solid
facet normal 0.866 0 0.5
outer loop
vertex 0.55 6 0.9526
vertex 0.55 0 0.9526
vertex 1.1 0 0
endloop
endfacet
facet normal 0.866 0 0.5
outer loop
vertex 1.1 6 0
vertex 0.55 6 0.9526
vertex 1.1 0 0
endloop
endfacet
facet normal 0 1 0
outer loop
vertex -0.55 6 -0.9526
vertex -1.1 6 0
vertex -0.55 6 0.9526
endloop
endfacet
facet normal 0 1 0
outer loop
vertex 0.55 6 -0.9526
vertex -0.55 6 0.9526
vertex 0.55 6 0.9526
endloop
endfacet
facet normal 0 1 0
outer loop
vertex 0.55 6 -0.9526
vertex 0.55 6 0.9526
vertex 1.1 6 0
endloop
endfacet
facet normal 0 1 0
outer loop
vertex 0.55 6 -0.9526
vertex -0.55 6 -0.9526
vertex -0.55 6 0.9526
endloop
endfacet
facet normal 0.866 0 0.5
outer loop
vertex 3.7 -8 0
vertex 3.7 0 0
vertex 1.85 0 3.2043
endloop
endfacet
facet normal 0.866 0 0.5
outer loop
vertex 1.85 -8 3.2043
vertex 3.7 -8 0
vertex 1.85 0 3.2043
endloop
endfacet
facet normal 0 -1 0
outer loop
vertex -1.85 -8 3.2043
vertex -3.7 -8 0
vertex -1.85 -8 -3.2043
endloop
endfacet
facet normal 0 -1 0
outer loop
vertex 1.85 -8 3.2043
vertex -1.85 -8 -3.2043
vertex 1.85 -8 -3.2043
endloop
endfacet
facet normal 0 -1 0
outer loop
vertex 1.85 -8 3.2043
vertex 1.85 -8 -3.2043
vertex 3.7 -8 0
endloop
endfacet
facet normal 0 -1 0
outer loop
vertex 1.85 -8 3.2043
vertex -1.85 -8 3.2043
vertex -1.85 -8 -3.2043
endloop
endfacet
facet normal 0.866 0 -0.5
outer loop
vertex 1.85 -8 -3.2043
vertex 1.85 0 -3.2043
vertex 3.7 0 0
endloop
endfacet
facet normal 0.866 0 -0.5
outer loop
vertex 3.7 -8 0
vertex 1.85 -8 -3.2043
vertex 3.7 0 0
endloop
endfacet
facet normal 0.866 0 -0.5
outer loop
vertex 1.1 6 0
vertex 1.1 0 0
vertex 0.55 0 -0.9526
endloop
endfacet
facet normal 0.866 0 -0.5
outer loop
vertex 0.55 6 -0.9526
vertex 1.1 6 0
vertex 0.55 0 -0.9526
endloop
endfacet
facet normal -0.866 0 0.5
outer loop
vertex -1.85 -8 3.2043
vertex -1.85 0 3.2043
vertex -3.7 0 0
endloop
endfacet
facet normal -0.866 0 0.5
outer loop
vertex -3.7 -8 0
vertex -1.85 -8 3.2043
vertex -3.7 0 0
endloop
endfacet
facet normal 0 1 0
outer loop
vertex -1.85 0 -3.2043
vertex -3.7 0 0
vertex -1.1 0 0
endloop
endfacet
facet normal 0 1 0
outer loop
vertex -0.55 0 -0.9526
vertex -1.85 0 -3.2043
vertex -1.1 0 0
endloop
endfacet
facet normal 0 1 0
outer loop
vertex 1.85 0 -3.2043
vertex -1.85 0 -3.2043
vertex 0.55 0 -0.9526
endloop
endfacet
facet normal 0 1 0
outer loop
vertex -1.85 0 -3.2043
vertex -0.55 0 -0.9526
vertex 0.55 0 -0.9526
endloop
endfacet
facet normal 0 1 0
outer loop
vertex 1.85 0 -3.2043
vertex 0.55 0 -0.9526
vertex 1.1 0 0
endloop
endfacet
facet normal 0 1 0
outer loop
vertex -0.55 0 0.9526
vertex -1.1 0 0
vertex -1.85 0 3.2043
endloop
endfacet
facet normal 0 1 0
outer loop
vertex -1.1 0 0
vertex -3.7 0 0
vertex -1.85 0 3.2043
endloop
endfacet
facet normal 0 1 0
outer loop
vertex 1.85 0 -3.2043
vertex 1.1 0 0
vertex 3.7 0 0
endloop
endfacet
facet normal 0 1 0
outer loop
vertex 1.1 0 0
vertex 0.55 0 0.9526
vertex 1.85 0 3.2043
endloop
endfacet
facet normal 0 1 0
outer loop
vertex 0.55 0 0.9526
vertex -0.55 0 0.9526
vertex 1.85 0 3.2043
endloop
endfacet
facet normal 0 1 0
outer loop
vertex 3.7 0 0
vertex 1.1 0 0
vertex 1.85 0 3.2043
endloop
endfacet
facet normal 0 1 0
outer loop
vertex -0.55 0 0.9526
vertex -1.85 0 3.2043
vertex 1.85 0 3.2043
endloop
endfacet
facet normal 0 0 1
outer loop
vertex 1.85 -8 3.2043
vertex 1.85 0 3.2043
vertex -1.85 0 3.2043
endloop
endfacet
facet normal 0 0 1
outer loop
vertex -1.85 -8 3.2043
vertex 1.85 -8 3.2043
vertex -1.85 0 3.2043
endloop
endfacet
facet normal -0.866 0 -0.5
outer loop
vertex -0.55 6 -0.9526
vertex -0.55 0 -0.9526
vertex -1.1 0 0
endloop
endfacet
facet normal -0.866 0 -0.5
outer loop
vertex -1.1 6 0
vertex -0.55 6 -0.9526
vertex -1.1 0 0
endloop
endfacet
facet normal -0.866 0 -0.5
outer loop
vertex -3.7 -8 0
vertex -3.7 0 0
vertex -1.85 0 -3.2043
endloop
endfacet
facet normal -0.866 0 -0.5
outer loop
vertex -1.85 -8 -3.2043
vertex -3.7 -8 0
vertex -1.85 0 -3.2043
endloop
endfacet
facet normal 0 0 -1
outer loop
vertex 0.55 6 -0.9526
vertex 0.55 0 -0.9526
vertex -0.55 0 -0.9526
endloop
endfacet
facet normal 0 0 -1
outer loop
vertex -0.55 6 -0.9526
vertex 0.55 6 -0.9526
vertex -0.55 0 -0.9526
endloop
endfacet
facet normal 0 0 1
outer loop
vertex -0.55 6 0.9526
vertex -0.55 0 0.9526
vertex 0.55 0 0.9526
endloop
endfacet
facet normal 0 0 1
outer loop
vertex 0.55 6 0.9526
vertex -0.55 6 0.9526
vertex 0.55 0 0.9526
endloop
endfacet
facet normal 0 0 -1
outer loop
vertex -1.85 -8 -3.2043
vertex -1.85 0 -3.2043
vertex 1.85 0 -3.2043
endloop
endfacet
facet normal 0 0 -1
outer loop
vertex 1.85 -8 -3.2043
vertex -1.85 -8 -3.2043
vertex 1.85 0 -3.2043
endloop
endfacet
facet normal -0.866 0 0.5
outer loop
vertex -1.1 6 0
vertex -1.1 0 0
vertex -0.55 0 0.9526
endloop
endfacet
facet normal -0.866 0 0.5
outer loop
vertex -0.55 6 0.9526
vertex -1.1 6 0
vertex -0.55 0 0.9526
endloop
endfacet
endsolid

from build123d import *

# Parameters (mm, degrees)
BOSS_EXTRUDE1_DEPTH = 6
BOSS_EXTRUDE2_DEPTH = 8


with BuildPart() as part:
    # Sketch1 → Boss-Extrude1 (new body)
    with BuildSketch(Plane(origin=(0, 0, 0), x_dir=(1, 0, 0), z_dir=(0, 1, 0))):
        Polygon((1.1, 0), (0.55, 0.952627944), (-0.55, 0.952627944), (-1.1, 0), (-0.55, -0.952627944), (0.55, -0.952627944), align=None)
    extrude(amount=BOSS_EXTRUDE1_DEPTH)

    # Sketch2 → Boss-Extrude2 (add)
    with BuildSketch(Plane.XZ):
        Polygon((3.7, 0), (1.85, 3.204293994), (-1.85, 3.204293994), (-3.7, 0), (-1.85, -3.204293994), (1.85, -3.204293994), align=None)
    extrude(amount=BOSS_EXTRUDE2_DEPTH)


solid = part.part
